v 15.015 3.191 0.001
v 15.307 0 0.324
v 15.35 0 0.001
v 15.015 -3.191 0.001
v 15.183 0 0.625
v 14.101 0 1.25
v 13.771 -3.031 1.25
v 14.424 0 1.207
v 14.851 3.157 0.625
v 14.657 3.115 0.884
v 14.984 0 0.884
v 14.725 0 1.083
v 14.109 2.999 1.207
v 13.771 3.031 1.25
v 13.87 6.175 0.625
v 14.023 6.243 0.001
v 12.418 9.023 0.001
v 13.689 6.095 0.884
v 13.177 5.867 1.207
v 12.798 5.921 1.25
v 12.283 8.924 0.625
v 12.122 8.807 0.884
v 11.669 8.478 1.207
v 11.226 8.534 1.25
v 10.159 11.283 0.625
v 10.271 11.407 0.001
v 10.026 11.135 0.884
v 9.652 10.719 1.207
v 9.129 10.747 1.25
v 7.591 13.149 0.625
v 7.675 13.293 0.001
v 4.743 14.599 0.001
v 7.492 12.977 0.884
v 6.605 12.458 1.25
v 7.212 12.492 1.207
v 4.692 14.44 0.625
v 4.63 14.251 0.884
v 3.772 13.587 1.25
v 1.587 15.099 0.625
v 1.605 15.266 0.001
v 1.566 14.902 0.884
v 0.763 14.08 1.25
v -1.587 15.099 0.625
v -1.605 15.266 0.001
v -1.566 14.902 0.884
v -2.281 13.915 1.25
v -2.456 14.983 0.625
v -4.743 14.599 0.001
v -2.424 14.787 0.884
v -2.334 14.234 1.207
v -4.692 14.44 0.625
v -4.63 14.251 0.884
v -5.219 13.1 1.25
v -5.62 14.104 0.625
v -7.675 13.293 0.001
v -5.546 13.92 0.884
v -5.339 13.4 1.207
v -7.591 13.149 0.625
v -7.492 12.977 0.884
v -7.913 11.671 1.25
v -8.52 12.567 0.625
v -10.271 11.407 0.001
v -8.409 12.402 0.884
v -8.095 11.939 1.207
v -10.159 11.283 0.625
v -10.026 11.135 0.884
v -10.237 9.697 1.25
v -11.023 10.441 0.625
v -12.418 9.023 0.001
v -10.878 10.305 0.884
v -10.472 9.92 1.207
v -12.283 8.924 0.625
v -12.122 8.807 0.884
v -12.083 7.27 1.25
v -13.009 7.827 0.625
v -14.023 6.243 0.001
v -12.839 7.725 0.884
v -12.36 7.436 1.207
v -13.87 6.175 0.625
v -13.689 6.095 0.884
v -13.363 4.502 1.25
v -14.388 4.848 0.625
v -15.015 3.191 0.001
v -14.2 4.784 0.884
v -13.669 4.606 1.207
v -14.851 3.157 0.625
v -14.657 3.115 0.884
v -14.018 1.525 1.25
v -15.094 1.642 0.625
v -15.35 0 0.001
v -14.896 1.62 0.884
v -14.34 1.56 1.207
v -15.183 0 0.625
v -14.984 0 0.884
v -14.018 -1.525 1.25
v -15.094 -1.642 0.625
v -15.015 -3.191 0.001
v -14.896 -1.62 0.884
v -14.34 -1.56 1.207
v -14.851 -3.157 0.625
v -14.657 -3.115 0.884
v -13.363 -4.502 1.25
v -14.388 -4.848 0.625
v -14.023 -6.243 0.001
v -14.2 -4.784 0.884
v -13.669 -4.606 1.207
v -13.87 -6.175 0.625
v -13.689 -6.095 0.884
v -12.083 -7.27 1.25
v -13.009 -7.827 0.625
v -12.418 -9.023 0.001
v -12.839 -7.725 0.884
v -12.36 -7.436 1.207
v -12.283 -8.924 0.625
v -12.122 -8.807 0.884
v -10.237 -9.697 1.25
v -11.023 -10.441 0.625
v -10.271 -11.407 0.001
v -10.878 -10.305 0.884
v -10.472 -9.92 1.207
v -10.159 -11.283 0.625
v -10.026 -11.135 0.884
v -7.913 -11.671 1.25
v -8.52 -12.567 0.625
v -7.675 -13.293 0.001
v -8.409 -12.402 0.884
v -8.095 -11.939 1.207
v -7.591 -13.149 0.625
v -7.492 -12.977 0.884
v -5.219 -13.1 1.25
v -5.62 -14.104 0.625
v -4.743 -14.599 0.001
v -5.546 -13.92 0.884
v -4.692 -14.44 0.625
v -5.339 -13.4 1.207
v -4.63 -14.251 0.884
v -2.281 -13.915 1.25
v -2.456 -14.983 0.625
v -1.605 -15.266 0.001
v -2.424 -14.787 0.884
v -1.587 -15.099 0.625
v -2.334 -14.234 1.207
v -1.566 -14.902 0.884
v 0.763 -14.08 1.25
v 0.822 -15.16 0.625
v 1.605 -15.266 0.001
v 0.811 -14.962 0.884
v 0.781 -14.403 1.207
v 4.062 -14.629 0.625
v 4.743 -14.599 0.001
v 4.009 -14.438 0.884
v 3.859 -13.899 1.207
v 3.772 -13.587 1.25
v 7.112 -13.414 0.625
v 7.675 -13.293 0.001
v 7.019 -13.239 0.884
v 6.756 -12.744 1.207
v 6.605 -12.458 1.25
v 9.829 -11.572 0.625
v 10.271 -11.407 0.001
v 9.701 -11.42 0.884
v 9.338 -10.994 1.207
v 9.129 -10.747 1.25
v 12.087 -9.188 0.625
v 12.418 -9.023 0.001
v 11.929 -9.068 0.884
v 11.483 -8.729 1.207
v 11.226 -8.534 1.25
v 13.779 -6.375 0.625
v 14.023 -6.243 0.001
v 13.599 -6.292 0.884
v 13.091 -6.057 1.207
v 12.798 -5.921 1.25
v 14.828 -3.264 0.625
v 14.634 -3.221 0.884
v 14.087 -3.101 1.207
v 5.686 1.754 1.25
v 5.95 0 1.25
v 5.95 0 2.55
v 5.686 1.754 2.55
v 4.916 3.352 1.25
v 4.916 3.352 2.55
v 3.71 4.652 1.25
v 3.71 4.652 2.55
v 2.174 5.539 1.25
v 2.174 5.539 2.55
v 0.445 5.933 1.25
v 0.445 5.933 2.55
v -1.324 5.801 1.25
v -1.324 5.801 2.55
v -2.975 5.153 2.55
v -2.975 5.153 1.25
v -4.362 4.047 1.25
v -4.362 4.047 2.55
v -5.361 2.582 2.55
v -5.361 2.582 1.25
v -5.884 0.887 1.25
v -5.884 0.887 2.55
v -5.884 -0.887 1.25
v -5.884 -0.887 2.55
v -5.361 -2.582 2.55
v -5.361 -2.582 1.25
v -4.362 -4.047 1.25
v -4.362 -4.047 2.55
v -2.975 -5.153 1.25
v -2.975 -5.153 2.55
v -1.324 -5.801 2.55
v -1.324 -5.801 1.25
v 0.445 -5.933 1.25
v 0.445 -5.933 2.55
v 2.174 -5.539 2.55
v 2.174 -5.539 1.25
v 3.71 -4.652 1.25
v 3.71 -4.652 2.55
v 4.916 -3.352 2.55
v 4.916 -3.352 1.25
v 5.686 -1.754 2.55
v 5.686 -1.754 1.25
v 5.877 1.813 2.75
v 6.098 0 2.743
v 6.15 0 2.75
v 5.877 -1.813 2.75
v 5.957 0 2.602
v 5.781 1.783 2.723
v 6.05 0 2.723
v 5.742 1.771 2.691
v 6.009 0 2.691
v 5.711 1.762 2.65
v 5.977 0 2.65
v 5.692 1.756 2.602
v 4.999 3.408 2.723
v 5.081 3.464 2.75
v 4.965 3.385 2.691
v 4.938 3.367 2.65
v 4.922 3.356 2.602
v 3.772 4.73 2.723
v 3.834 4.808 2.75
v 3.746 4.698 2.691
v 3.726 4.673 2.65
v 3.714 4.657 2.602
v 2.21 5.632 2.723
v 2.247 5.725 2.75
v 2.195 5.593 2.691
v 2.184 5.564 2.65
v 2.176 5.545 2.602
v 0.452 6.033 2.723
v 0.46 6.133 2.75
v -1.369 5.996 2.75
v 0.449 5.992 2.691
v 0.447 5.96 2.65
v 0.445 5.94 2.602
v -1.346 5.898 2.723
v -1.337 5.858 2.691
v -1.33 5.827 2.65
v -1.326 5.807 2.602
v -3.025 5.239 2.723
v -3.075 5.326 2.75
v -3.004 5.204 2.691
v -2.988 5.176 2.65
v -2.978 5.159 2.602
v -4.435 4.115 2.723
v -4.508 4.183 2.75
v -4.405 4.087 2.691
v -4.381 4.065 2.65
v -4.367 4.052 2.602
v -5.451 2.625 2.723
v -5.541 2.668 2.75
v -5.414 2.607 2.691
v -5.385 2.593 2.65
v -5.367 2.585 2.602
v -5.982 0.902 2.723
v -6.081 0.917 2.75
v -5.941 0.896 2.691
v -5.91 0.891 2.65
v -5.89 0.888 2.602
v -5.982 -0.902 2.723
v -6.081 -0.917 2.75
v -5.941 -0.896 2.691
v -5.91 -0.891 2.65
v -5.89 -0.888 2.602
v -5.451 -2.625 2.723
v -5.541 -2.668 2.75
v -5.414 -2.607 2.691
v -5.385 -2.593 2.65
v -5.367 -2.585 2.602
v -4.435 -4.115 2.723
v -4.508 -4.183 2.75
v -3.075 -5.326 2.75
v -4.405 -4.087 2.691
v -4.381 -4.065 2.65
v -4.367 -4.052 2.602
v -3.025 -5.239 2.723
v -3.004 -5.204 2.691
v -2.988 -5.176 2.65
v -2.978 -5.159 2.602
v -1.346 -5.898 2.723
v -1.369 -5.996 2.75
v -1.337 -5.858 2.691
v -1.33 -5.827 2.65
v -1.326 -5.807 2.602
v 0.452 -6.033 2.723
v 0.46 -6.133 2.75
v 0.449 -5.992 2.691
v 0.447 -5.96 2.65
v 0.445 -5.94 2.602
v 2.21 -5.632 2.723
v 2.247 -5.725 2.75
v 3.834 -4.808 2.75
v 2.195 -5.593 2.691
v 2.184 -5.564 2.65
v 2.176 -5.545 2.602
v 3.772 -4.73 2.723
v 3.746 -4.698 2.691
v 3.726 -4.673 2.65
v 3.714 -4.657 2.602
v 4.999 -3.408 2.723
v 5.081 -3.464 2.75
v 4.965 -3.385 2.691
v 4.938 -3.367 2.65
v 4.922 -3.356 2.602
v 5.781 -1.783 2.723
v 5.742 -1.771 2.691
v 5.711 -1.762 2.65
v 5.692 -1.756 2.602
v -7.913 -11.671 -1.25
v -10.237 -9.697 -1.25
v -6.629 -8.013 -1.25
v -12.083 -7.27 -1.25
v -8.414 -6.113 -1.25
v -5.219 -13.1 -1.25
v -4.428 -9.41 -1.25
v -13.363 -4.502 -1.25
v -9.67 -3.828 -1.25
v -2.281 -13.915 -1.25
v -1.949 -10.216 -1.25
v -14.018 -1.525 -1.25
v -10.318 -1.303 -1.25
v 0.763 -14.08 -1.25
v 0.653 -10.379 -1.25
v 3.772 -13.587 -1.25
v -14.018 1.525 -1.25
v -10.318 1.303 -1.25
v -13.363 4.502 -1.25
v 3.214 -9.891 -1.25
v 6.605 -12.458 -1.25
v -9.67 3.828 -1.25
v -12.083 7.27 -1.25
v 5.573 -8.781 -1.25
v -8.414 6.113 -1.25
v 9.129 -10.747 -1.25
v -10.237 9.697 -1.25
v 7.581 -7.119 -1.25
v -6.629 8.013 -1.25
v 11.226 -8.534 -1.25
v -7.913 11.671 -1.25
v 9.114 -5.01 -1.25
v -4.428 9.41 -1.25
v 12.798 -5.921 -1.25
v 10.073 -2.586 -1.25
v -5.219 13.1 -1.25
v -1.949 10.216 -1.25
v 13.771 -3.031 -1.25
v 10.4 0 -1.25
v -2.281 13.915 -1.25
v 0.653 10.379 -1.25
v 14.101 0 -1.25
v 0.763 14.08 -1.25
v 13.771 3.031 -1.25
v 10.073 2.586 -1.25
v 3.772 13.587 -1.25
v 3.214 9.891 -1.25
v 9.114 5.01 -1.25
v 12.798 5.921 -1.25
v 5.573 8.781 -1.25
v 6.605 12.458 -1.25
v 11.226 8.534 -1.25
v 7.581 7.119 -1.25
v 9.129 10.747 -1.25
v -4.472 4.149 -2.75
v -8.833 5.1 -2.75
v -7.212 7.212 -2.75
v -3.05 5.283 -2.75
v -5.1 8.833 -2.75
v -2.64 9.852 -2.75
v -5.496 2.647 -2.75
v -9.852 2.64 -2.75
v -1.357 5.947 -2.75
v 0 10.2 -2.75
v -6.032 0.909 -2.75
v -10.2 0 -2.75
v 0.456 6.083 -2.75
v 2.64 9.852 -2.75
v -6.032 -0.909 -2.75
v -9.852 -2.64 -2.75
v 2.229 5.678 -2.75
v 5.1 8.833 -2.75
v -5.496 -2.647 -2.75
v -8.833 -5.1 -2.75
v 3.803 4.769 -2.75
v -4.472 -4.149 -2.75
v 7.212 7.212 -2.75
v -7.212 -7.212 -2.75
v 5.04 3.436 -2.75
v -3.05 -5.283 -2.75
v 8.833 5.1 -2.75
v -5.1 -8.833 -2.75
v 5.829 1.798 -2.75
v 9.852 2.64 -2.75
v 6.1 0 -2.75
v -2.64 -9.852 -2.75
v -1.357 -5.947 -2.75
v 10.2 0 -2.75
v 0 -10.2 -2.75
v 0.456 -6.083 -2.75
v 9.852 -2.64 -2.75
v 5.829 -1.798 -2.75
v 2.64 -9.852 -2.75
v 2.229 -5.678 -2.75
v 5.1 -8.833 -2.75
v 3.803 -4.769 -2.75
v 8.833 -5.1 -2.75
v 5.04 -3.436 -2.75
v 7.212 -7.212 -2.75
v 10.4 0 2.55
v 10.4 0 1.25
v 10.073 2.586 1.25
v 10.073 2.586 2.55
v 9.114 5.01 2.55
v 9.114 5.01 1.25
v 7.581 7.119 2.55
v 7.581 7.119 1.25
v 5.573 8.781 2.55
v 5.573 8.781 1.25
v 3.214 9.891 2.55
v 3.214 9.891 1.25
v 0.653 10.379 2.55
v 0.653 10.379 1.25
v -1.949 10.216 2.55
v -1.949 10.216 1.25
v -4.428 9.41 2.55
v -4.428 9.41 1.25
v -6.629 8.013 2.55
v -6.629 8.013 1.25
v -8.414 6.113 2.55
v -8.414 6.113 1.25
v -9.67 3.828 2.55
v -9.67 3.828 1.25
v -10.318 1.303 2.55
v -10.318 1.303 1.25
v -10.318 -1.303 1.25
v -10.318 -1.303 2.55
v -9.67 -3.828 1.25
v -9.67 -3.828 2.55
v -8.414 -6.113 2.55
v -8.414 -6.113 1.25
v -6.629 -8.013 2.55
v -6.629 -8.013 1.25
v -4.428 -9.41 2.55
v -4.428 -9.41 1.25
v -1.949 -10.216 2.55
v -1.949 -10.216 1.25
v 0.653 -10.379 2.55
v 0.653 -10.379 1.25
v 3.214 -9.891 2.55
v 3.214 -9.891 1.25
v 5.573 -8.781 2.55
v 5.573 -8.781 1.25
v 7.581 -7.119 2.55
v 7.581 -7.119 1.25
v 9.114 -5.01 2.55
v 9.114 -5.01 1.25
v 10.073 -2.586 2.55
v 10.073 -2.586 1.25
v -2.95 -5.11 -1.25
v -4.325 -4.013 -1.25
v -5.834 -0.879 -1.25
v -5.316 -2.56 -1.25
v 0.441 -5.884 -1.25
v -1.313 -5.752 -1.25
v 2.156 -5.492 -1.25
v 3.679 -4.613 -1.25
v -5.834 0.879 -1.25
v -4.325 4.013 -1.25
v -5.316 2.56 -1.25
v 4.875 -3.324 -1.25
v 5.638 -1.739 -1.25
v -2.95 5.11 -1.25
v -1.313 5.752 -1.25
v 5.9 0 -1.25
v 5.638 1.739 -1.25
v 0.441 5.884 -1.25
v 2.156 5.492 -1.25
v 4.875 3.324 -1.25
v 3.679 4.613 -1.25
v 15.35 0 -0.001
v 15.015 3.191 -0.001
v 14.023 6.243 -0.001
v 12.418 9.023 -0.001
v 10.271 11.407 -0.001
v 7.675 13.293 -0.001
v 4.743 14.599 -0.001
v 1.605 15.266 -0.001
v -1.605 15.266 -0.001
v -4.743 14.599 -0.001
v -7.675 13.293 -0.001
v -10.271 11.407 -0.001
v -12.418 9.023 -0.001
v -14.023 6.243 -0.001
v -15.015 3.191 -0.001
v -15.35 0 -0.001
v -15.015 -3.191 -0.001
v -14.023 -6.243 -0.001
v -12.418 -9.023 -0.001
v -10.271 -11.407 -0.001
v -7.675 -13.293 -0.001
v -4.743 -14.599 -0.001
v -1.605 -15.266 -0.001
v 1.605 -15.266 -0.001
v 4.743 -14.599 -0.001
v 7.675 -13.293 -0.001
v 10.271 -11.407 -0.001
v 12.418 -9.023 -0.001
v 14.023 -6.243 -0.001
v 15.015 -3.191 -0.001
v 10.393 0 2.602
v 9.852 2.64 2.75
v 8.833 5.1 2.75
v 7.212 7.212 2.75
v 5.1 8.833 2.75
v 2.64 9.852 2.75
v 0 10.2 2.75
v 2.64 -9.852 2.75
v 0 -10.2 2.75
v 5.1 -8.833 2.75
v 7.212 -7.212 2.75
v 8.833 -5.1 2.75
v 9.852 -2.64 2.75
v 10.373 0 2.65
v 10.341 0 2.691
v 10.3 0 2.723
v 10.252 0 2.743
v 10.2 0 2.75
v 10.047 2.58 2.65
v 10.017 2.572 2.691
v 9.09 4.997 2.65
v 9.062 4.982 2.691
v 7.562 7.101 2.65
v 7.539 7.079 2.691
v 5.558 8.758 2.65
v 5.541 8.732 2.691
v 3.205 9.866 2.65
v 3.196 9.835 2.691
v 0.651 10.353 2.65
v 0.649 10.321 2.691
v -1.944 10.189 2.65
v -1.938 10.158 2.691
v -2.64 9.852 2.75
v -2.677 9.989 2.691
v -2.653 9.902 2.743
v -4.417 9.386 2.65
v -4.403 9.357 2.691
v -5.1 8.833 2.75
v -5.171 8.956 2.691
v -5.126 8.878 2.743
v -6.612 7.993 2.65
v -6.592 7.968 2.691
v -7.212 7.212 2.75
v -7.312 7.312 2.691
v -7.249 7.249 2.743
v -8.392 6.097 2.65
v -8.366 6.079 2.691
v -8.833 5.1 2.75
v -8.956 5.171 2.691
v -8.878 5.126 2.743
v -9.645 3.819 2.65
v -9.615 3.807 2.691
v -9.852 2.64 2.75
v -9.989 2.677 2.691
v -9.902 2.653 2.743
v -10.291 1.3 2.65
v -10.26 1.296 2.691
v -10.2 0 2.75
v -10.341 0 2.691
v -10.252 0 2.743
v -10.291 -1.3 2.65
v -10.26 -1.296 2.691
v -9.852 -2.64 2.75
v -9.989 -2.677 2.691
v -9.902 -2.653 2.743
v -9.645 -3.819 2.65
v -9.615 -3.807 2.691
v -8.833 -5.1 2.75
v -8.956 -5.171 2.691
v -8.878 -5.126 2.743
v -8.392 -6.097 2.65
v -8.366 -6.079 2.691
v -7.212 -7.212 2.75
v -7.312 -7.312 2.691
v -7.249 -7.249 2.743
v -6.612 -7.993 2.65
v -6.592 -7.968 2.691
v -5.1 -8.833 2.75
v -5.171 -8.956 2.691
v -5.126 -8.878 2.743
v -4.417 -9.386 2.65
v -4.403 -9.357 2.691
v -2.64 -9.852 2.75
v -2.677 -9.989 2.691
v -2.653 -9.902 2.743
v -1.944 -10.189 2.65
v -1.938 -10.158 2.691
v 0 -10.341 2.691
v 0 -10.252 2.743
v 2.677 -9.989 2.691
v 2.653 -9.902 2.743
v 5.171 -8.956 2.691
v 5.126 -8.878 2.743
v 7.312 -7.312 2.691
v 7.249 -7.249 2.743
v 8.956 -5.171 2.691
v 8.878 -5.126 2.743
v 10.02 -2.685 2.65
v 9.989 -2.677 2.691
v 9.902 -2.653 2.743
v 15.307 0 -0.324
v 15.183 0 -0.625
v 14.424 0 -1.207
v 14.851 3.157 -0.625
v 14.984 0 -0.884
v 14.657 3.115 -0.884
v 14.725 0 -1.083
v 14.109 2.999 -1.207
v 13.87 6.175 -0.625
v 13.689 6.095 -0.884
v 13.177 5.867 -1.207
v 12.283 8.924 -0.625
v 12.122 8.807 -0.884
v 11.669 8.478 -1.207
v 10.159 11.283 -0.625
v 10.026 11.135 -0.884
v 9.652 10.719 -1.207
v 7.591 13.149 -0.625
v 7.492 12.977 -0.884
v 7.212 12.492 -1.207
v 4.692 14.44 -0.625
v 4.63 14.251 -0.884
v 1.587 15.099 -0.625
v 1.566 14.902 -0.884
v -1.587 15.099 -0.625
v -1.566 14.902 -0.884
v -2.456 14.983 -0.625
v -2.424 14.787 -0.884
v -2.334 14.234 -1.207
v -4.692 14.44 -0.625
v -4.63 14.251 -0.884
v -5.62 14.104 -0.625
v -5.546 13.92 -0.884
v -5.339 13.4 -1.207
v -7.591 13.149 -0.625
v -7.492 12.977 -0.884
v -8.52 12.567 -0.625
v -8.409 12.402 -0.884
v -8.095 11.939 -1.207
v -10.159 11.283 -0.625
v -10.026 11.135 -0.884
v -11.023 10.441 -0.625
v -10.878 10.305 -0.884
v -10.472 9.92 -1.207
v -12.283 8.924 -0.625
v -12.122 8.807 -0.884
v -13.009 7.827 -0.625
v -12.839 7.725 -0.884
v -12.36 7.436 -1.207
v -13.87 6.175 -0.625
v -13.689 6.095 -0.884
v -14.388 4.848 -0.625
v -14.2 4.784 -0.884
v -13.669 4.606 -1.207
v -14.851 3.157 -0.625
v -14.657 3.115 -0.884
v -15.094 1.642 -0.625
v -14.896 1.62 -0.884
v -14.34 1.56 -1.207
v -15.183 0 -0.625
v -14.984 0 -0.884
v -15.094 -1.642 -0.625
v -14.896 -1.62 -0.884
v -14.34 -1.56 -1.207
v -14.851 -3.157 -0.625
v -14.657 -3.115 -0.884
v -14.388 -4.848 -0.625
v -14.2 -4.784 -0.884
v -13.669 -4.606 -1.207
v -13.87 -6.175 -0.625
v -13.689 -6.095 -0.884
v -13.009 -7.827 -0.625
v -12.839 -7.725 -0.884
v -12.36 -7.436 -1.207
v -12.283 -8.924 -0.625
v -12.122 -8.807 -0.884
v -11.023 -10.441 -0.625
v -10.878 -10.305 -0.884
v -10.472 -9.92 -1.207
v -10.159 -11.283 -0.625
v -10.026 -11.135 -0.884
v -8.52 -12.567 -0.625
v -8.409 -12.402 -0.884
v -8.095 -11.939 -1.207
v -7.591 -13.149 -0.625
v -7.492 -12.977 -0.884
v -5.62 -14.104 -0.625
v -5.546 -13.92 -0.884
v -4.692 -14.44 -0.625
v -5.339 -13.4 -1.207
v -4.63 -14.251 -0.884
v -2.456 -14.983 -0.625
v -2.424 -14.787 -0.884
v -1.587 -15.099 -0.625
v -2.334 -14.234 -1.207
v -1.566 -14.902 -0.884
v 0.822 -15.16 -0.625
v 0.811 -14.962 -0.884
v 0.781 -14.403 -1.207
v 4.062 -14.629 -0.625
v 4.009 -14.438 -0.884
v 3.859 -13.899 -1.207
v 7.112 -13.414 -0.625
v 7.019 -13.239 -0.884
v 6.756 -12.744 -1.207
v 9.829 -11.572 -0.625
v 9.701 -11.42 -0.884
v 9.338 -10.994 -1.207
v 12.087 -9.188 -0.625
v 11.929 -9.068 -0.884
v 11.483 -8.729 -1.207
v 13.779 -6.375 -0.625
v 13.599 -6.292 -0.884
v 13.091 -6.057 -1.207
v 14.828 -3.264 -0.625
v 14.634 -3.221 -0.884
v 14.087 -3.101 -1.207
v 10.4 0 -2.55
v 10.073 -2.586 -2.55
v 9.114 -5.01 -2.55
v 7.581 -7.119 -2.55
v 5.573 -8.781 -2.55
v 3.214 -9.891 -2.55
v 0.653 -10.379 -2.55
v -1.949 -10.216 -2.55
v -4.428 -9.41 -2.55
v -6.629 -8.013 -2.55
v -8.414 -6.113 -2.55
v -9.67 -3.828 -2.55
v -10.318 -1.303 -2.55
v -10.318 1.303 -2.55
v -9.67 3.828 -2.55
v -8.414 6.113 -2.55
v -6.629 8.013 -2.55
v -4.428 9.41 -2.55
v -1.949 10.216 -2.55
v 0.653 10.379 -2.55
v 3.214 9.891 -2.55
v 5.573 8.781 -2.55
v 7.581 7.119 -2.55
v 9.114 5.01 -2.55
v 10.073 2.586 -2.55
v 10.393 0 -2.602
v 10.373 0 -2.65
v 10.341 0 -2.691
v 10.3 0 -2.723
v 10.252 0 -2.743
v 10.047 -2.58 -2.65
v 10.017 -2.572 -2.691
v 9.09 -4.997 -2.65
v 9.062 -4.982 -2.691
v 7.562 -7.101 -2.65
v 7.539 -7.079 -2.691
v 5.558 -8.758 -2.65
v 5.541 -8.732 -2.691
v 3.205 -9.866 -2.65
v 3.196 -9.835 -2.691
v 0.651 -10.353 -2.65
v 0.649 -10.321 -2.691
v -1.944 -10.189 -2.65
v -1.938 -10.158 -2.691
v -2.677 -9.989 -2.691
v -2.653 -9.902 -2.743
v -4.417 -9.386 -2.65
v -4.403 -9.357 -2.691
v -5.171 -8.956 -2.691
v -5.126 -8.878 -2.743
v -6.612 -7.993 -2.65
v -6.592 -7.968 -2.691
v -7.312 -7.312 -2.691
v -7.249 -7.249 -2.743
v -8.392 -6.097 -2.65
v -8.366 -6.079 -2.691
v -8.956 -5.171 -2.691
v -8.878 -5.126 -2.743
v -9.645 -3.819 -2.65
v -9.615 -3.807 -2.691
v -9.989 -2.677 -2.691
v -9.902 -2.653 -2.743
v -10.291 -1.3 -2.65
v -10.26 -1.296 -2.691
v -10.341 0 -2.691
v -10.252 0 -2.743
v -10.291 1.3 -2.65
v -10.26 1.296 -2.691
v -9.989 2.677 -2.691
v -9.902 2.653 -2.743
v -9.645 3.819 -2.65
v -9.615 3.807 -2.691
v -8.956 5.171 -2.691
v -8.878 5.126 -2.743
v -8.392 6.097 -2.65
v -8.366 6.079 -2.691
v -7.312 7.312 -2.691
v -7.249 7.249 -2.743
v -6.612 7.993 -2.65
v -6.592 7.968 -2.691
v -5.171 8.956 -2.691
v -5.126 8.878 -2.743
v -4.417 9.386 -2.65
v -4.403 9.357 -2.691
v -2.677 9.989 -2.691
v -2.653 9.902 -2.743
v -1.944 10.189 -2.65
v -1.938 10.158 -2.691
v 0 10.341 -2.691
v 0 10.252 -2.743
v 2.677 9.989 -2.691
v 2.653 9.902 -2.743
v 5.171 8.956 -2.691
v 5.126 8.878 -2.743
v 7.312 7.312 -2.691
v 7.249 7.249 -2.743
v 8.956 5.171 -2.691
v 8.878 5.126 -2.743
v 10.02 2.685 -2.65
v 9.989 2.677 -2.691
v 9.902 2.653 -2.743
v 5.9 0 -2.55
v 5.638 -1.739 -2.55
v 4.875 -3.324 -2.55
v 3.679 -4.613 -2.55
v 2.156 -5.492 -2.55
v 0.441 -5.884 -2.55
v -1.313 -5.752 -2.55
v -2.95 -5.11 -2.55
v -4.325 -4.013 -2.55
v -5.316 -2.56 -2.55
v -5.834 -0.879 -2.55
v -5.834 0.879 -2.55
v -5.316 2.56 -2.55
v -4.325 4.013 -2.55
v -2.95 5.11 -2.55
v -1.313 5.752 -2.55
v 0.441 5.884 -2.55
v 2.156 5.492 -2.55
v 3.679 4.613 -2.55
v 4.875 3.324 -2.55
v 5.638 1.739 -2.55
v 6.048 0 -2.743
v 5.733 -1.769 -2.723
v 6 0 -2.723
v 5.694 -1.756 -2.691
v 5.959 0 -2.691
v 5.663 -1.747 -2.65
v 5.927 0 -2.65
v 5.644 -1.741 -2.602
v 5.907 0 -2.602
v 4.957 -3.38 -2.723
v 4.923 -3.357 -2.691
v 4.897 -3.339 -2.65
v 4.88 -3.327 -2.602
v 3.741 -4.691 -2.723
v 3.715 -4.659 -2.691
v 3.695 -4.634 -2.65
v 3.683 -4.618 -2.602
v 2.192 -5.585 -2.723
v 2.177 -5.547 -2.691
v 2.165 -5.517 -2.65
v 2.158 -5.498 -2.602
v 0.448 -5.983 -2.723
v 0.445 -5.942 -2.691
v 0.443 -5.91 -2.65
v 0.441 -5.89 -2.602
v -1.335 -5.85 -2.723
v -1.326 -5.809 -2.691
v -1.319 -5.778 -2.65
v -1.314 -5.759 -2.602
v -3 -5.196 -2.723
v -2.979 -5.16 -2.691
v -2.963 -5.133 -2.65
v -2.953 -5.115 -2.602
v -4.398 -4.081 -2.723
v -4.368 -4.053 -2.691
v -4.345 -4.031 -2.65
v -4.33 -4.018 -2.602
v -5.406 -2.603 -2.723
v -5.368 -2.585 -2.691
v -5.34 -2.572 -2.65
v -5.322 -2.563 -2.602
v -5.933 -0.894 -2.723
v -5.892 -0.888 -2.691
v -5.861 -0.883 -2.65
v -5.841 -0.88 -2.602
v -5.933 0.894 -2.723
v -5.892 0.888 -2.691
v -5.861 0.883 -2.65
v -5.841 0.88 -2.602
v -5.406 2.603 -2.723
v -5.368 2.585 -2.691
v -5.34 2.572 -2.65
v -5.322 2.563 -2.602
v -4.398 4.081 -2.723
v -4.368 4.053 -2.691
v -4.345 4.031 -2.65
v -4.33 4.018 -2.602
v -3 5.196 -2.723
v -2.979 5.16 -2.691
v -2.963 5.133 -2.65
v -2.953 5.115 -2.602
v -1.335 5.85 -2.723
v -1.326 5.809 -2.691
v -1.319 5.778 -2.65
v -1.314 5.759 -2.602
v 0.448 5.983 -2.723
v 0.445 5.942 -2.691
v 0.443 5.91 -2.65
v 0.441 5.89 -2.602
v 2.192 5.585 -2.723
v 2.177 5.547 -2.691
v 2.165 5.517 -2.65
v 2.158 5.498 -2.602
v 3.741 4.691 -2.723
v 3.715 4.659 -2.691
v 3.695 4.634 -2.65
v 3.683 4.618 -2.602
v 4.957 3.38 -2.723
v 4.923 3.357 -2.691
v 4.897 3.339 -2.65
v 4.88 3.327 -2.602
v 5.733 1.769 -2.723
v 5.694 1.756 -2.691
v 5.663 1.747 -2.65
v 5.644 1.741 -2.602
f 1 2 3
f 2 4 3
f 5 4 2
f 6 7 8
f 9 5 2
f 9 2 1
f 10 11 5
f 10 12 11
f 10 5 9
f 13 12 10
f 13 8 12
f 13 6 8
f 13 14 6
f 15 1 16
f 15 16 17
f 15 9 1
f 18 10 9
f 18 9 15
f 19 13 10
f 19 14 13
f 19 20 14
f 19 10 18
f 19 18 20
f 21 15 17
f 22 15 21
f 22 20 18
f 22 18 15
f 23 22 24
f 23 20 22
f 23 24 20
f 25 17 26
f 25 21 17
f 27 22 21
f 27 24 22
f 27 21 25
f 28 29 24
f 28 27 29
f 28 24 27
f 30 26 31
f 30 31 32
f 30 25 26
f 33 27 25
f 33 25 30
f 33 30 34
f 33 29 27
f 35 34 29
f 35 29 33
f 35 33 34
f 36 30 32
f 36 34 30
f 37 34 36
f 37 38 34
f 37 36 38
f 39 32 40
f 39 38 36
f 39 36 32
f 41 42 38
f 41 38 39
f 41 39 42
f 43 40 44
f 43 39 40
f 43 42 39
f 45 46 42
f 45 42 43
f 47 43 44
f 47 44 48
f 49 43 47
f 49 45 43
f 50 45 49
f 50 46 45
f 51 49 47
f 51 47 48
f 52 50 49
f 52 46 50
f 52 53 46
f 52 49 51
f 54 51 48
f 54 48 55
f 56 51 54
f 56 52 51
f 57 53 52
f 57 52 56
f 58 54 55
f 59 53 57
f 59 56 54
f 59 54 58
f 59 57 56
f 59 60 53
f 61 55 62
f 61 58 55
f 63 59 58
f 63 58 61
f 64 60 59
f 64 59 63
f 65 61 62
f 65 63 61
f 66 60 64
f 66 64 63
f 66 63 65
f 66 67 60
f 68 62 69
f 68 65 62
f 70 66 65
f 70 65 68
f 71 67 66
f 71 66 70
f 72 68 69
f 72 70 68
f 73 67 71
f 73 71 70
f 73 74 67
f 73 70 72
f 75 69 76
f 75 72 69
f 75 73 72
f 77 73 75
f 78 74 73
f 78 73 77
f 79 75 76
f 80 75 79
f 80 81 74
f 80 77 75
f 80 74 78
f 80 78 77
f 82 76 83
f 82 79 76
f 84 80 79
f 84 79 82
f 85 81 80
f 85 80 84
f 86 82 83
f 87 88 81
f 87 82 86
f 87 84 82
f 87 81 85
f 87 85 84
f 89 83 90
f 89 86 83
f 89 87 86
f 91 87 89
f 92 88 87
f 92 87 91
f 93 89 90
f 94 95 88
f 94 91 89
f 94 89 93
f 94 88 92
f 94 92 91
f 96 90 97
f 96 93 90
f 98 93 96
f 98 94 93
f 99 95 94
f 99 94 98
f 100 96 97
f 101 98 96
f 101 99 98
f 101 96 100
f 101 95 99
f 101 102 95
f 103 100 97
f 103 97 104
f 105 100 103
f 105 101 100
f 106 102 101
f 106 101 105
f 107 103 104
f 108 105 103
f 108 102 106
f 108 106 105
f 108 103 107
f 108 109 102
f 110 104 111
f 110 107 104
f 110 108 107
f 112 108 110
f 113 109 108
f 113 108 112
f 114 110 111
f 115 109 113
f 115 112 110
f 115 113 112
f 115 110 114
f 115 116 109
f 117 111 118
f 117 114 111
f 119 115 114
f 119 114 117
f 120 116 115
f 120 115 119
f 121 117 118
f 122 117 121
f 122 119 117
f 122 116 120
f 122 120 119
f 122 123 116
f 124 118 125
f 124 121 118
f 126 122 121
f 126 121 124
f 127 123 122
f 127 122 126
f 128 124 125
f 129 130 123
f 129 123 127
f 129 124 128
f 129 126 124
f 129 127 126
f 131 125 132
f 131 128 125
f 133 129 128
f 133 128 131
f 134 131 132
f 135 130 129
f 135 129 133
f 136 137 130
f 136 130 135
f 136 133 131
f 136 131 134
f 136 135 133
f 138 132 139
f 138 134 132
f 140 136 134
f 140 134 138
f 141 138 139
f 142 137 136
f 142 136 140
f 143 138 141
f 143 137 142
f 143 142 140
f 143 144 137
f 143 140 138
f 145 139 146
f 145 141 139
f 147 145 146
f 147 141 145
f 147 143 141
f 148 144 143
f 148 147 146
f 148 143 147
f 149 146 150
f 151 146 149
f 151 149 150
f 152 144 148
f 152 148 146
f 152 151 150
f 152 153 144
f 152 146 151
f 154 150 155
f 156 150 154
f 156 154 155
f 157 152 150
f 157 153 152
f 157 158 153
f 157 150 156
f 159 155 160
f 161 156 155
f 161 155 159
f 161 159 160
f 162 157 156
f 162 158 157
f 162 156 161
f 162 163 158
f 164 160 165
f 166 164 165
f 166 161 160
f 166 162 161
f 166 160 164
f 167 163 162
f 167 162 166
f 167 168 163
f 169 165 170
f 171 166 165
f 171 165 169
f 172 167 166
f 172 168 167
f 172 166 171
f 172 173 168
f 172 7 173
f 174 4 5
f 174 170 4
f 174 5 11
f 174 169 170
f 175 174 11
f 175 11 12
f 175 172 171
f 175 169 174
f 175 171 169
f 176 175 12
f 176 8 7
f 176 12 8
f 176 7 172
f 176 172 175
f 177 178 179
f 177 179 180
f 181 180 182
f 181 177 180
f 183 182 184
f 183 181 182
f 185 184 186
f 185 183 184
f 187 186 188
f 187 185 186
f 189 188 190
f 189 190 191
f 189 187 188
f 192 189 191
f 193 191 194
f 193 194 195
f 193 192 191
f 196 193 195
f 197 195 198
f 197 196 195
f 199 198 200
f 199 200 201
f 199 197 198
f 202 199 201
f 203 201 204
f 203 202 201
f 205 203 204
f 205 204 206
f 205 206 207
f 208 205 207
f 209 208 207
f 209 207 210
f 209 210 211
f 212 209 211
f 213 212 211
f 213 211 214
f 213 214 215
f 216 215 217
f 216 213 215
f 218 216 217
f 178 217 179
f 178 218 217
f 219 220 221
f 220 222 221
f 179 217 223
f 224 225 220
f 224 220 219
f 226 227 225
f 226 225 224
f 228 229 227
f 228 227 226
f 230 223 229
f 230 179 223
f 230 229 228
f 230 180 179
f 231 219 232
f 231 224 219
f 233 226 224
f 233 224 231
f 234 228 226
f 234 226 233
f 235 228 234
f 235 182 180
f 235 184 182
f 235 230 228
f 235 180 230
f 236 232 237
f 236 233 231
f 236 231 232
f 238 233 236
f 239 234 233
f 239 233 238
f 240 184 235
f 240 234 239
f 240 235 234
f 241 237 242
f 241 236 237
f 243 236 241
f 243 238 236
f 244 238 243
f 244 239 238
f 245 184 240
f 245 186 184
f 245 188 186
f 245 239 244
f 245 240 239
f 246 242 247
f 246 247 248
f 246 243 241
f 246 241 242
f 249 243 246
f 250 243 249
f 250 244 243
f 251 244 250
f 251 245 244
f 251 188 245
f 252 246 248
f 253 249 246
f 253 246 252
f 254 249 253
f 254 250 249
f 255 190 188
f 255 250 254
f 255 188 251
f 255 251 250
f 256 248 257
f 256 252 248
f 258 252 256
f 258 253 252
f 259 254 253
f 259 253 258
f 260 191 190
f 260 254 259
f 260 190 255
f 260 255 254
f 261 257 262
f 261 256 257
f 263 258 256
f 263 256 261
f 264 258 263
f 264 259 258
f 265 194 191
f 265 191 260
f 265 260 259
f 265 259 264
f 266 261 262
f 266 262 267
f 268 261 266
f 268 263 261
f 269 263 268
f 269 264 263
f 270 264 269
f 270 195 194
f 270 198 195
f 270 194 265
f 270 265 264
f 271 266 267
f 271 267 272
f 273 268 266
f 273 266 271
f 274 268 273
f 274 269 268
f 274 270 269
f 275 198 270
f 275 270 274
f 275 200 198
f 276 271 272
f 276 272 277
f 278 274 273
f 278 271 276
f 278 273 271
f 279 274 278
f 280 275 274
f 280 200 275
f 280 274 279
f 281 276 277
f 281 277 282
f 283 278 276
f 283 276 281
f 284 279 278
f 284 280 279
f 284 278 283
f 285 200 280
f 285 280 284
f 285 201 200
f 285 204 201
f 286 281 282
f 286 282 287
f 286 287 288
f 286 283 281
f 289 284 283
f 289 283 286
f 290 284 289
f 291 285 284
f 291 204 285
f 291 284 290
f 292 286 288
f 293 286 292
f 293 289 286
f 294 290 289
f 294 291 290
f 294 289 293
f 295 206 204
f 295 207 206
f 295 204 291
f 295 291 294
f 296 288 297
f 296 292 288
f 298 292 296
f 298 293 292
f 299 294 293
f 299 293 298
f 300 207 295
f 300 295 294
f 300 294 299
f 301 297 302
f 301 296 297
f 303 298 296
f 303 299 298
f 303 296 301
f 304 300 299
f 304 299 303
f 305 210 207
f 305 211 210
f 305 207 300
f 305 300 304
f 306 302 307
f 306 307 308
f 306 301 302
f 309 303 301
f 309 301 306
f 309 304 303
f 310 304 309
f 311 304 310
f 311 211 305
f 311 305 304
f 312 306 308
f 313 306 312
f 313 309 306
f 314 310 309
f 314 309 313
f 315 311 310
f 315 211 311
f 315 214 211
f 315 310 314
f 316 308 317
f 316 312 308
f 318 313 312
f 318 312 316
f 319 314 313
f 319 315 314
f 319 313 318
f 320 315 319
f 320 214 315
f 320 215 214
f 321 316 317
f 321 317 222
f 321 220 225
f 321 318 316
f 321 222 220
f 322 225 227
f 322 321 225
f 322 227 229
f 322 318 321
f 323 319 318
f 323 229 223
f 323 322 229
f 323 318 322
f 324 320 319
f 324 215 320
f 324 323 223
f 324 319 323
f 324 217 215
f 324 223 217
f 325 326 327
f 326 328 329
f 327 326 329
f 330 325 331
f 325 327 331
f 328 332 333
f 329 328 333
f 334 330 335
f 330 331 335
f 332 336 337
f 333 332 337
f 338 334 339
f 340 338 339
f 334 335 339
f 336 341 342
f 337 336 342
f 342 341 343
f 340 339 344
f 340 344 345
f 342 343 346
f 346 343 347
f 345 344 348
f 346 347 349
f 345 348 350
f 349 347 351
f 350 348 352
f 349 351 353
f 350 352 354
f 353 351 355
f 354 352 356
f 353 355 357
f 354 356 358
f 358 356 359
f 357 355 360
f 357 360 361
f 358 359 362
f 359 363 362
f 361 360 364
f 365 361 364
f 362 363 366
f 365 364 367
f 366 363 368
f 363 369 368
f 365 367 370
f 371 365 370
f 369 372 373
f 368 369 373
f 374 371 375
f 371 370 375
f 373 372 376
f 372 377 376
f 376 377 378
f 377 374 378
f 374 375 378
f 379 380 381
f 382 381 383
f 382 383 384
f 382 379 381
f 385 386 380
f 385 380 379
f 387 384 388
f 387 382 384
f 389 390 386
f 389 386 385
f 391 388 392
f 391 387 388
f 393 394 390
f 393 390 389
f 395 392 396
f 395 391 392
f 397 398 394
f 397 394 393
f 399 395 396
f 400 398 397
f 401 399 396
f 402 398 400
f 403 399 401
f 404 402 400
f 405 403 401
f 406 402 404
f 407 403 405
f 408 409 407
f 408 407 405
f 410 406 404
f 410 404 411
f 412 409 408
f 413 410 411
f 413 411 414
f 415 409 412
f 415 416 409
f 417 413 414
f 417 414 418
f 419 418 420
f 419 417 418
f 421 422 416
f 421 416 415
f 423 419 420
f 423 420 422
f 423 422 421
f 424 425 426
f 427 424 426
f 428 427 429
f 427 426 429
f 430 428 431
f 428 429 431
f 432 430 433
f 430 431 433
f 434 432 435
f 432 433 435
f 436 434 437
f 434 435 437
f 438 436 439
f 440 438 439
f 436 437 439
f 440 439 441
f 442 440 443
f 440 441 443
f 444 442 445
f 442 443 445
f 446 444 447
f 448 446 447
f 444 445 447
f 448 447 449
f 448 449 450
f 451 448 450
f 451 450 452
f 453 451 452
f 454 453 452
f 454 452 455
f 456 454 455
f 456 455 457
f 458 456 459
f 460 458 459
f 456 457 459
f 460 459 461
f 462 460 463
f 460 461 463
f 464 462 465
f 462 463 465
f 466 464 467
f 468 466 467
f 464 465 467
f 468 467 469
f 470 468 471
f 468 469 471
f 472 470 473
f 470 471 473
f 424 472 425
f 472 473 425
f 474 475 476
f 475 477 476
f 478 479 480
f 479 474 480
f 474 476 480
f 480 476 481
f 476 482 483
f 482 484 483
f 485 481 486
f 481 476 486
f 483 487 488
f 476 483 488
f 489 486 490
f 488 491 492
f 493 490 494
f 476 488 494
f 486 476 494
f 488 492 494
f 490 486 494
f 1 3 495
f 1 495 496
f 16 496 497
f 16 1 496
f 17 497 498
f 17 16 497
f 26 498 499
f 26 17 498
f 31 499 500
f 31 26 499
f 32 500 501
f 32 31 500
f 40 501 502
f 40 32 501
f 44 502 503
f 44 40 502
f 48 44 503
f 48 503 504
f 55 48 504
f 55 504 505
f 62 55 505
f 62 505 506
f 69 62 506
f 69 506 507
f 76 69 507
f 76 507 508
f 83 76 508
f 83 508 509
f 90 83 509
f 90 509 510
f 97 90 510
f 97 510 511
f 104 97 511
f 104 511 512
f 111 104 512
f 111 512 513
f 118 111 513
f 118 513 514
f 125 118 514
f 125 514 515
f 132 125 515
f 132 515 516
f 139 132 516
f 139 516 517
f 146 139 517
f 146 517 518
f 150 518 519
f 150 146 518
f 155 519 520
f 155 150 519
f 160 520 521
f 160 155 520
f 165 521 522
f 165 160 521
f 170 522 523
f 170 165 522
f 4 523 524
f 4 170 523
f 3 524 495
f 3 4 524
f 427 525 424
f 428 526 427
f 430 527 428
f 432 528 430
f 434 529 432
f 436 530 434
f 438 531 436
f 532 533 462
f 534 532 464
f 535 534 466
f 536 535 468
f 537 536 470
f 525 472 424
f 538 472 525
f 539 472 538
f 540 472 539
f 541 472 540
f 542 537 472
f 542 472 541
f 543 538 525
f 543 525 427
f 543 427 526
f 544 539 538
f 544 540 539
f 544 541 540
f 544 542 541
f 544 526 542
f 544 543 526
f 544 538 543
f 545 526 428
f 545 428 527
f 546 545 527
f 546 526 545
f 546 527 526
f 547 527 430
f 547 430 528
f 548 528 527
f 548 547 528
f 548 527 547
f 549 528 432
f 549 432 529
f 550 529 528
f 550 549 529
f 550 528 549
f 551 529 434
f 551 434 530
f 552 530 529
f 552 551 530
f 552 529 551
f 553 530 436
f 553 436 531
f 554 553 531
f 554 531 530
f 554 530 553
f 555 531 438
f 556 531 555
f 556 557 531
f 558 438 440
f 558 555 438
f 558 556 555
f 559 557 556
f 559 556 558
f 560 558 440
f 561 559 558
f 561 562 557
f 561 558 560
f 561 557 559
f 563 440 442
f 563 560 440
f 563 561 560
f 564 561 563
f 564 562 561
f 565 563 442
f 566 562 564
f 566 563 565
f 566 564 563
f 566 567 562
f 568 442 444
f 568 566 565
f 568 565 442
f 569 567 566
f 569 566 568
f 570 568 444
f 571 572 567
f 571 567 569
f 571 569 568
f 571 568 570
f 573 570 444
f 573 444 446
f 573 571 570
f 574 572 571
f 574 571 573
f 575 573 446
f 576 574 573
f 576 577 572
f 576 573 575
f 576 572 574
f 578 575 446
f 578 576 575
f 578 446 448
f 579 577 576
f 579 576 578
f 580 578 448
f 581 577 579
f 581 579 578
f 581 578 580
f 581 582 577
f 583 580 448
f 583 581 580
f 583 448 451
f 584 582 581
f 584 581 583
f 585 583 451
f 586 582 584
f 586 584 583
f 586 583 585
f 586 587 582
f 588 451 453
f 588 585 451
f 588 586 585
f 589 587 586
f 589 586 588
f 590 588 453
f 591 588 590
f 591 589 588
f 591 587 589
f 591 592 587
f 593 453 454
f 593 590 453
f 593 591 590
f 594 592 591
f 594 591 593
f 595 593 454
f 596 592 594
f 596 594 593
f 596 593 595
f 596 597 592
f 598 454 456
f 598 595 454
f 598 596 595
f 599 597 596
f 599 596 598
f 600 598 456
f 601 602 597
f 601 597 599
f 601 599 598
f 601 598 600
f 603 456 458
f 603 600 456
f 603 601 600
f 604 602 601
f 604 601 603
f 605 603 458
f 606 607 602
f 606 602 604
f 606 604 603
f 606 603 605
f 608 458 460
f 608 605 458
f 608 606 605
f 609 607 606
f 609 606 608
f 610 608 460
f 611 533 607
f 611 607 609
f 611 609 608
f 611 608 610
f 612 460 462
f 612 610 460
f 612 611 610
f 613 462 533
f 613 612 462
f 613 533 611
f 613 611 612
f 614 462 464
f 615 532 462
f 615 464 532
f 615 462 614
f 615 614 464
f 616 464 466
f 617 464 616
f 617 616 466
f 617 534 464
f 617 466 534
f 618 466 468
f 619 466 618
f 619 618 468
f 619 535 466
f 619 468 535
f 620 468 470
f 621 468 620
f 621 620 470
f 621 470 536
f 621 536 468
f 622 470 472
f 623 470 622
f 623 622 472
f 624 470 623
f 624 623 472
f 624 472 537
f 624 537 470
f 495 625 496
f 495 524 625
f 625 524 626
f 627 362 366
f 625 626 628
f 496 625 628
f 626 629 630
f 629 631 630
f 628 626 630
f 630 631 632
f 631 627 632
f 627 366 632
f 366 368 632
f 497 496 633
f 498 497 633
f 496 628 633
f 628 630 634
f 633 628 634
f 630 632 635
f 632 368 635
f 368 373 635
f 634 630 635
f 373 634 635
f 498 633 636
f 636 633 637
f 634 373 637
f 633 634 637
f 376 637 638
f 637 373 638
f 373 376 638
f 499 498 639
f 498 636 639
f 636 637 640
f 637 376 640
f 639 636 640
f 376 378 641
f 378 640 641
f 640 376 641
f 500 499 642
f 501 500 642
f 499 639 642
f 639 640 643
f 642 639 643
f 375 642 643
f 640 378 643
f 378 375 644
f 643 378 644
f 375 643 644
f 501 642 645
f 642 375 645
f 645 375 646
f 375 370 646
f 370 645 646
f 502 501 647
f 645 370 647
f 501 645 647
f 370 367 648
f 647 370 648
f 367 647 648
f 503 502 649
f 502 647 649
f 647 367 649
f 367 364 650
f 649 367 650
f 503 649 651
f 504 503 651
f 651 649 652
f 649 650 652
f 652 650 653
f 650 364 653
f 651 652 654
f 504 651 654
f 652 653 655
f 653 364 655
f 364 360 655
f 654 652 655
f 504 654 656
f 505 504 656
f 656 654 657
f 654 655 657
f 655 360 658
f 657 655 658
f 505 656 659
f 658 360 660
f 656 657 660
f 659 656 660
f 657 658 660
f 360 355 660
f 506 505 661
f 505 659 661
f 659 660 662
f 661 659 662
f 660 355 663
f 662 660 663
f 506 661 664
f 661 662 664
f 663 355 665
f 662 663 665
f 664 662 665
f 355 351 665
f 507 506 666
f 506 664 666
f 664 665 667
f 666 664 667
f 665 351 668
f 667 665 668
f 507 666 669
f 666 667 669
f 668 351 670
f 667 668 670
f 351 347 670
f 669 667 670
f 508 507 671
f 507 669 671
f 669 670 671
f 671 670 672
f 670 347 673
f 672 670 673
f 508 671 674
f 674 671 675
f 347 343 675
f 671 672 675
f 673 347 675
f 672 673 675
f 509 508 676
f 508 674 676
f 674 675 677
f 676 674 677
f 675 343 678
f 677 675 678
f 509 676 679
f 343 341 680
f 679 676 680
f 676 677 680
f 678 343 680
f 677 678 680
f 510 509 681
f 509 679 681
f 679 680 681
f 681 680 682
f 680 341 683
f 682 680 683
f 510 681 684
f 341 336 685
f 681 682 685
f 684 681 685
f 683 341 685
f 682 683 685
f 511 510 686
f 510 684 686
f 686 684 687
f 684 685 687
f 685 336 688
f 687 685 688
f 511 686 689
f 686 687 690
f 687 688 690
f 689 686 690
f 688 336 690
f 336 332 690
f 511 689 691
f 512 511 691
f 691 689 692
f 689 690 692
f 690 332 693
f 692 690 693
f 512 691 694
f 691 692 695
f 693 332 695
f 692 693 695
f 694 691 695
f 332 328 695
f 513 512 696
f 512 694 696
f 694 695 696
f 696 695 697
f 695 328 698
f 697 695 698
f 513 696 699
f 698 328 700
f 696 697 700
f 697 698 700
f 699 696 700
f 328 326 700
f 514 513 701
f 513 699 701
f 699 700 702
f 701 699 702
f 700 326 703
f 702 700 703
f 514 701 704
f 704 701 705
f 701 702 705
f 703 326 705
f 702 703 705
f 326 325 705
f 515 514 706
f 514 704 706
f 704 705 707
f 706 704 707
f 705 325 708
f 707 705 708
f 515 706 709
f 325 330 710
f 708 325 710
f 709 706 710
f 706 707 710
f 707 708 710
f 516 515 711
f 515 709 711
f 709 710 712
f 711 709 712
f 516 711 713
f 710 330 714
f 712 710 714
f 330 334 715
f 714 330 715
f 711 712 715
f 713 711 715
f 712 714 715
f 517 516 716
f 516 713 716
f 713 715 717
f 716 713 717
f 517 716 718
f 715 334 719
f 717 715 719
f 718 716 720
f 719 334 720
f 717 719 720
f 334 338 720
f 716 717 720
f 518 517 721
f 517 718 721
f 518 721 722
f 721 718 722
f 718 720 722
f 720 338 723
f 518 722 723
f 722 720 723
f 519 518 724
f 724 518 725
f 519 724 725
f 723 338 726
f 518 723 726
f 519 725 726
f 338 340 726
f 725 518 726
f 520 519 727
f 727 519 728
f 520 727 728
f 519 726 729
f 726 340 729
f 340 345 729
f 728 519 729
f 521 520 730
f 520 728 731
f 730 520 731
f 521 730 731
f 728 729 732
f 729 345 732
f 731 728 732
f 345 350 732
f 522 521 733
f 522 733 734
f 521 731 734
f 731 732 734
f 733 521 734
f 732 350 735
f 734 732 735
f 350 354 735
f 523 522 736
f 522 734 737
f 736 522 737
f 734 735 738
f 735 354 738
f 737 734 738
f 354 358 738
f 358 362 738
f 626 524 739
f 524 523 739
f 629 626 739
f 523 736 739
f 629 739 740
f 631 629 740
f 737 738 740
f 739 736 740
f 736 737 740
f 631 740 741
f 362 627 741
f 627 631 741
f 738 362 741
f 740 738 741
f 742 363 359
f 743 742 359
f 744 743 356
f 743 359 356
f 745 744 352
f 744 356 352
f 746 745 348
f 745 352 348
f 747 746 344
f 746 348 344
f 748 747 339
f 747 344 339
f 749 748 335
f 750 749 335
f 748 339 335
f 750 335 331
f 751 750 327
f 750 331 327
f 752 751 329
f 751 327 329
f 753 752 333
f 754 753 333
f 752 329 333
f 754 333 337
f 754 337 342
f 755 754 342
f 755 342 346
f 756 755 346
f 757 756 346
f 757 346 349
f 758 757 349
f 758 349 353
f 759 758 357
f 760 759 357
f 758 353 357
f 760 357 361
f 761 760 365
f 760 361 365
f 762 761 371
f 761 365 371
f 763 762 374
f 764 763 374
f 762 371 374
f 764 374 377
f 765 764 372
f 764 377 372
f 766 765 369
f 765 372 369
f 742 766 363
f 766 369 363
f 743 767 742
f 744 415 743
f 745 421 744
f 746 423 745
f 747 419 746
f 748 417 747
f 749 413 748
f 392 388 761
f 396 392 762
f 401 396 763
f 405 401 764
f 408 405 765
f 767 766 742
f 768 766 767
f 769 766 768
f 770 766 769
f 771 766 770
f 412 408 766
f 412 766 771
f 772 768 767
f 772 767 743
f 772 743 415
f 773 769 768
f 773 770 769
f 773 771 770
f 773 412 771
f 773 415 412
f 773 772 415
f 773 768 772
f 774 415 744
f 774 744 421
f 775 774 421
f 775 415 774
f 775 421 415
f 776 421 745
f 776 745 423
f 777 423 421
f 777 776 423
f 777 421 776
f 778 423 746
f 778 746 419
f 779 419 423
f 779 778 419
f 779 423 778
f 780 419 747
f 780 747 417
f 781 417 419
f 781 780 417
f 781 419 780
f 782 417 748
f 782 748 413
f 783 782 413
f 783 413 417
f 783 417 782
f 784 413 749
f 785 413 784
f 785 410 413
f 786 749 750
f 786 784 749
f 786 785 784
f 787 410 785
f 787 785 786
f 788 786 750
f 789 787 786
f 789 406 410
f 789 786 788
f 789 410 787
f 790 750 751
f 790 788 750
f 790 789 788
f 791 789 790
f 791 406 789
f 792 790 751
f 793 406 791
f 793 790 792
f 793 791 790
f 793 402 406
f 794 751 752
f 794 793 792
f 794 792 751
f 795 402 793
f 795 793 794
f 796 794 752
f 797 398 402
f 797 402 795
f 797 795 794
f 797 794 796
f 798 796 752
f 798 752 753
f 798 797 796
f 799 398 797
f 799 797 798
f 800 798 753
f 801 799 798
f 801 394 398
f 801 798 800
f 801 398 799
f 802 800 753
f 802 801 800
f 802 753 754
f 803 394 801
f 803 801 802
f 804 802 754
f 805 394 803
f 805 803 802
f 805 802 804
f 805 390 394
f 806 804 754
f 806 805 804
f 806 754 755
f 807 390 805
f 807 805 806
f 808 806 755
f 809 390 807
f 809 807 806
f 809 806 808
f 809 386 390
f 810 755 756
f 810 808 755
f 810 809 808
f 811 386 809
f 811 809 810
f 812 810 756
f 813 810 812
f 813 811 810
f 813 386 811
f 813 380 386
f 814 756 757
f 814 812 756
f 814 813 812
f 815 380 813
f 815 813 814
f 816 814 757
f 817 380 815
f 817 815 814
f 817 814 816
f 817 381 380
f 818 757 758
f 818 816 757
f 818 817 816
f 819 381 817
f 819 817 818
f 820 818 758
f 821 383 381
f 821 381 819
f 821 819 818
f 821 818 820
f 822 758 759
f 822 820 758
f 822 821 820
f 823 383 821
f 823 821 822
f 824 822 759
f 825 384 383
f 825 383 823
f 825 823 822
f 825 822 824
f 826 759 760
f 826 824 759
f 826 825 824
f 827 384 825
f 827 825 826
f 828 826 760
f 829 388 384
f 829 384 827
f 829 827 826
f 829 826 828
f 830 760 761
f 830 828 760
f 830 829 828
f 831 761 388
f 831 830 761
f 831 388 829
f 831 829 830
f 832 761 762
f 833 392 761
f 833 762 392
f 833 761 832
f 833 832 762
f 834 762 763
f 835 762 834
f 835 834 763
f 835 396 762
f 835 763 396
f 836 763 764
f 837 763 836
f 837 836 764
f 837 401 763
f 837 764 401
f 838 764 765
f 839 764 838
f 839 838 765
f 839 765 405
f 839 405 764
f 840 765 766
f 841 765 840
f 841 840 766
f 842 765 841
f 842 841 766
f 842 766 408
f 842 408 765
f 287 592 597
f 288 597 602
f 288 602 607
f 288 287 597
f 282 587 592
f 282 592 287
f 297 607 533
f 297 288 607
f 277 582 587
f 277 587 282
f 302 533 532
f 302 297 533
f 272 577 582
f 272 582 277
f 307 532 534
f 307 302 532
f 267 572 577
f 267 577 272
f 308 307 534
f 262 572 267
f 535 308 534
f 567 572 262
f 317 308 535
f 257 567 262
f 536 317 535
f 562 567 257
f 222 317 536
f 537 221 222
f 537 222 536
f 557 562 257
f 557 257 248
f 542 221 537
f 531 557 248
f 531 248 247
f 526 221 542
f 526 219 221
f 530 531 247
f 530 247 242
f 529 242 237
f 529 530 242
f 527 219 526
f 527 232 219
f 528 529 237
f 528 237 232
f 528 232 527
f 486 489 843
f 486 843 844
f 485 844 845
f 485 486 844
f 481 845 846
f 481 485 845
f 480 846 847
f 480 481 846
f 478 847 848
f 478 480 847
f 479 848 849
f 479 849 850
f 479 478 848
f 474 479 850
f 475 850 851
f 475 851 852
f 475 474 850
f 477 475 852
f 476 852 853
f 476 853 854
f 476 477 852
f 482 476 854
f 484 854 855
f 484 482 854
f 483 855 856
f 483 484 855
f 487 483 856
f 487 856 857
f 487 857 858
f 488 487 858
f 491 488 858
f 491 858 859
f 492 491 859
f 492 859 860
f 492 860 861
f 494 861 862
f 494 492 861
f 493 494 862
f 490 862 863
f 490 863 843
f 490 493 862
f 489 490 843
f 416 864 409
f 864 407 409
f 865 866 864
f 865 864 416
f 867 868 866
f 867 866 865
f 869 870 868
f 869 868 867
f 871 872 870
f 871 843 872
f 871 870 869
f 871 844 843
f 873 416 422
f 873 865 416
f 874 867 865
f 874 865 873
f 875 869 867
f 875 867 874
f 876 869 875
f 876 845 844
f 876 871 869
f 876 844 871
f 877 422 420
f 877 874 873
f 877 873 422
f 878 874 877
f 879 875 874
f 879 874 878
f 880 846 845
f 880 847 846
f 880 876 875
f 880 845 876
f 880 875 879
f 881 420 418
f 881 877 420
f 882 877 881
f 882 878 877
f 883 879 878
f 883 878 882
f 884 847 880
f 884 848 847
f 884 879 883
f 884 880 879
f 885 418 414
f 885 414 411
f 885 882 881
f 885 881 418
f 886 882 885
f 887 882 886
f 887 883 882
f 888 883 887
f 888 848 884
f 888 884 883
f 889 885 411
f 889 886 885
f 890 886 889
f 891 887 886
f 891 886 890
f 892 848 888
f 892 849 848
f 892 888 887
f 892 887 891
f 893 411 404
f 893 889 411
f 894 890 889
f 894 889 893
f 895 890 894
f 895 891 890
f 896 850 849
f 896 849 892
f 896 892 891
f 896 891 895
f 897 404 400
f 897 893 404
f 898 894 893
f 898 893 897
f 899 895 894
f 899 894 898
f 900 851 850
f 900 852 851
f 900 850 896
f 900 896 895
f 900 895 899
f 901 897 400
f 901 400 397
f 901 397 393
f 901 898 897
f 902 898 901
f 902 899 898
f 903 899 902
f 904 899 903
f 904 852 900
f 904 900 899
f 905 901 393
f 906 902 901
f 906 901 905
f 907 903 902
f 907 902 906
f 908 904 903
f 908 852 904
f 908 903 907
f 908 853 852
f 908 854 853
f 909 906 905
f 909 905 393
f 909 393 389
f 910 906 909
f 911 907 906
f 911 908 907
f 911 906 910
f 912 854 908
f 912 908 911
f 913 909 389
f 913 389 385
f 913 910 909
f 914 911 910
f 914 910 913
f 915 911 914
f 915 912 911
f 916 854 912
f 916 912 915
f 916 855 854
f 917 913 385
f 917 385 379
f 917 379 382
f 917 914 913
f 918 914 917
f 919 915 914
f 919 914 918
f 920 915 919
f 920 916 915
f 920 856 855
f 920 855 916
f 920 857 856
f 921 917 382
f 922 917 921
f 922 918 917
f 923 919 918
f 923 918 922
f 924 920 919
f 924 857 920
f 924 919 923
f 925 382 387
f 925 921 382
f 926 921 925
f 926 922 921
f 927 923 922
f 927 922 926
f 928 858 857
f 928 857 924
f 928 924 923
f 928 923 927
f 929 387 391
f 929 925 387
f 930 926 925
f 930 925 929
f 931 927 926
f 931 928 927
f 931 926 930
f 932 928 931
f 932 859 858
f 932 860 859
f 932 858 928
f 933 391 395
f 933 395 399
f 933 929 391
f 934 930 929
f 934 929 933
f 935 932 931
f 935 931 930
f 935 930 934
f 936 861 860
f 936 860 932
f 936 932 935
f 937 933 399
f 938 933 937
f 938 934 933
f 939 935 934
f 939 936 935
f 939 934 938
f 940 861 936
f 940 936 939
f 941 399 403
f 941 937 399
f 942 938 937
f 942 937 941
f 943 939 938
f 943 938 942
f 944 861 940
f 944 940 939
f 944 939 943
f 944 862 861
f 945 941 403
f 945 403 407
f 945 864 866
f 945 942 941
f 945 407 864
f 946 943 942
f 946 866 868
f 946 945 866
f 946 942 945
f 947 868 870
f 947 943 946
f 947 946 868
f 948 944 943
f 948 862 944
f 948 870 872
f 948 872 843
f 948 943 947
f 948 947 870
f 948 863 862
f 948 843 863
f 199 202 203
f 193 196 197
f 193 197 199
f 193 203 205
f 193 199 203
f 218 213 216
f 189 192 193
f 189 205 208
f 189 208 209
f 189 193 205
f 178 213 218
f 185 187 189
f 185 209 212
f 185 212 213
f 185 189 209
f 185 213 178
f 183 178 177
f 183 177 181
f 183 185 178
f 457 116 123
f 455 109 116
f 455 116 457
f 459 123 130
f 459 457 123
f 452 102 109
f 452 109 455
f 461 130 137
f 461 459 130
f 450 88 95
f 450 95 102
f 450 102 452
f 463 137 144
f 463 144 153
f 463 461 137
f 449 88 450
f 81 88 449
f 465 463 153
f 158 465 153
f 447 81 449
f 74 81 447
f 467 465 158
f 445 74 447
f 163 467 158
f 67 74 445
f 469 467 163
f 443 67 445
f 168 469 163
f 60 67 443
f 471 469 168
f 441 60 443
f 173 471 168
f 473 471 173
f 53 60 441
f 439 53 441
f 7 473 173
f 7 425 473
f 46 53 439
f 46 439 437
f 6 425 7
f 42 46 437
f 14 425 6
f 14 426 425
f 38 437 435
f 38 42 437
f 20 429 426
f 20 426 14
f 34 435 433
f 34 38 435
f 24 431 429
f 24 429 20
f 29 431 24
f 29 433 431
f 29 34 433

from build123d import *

# Parameters (mm, degrees)
SKETCH_R      = 15.35
PAD_DEPTH     = 1.25
SKETCH001_R   = 10.4
SKETCH001_R_2 = 5.95
PAD001_DEPTH  = 1.5
SKETCH002_R   = 10.4
SKETCH002_R_2 = 5.9
PAD002_DEPTH  = 1.5
FILLET_R      = 1.249
FILLET001_R   = 0.2
FILLET002_R   = 0.2


with BuildPart() as part:
    # Sketch → Pad (new body, symmetric)
    with BuildSketch(Plane.XY):
        Circle(SKETCH_R)
    extrude(amount=PAD_DEPTH, both=True)

    # Sketch001 → Pad001 (new body)
    with BuildSketch(Plane.XY.offset(1.25)):
        Circle(SKETCH001_R)
        Circle(SKETCH001_R_2, mode=Mode.SUBTRACT)
    extrude(amount=PAD001_DEPTH)

    # Sketch002 → Pad002 (new body)
    with BuildSketch(Plane(origin=(0, 0, -1.25), x_dir=(1, 0, 0), z_dir=(0, 0, -1))):
        Circle(SKETCH002_R)
        Circle(SKETCH002_R_2, mode=Mode.SUBTRACT)
    extrude(amount=PAD002_DEPTH)

    # Fillet
    fillet_edges = [part.edges().sort_by_distance(p)[0] for p in [
        (-15.35, 0, -1.25),
        (-15.35, 0, 1.25),
    ]]
    fillet(fillet_edges, radius=FILLET_R)

    # Fillet001
    fillet001_edges = [part.edges().sort_by_distance(p)[0] for p in [
        (-5.95, 0, 2.75),
        (-10.4, 0, 2.75),
    ]]
    fillet(fillet001_edges, radius=FILLET001_R)

    # Fillet002
    fillet002_edges = [part.edges().sort_by_distance(p)[0] for p in [
        (-5.9, 0, -2.75),
        (-10.4, 0, -2.75),
    ]]
    fillet(fillet002_edges, radius=FILLET002_R)


solid = part.part
